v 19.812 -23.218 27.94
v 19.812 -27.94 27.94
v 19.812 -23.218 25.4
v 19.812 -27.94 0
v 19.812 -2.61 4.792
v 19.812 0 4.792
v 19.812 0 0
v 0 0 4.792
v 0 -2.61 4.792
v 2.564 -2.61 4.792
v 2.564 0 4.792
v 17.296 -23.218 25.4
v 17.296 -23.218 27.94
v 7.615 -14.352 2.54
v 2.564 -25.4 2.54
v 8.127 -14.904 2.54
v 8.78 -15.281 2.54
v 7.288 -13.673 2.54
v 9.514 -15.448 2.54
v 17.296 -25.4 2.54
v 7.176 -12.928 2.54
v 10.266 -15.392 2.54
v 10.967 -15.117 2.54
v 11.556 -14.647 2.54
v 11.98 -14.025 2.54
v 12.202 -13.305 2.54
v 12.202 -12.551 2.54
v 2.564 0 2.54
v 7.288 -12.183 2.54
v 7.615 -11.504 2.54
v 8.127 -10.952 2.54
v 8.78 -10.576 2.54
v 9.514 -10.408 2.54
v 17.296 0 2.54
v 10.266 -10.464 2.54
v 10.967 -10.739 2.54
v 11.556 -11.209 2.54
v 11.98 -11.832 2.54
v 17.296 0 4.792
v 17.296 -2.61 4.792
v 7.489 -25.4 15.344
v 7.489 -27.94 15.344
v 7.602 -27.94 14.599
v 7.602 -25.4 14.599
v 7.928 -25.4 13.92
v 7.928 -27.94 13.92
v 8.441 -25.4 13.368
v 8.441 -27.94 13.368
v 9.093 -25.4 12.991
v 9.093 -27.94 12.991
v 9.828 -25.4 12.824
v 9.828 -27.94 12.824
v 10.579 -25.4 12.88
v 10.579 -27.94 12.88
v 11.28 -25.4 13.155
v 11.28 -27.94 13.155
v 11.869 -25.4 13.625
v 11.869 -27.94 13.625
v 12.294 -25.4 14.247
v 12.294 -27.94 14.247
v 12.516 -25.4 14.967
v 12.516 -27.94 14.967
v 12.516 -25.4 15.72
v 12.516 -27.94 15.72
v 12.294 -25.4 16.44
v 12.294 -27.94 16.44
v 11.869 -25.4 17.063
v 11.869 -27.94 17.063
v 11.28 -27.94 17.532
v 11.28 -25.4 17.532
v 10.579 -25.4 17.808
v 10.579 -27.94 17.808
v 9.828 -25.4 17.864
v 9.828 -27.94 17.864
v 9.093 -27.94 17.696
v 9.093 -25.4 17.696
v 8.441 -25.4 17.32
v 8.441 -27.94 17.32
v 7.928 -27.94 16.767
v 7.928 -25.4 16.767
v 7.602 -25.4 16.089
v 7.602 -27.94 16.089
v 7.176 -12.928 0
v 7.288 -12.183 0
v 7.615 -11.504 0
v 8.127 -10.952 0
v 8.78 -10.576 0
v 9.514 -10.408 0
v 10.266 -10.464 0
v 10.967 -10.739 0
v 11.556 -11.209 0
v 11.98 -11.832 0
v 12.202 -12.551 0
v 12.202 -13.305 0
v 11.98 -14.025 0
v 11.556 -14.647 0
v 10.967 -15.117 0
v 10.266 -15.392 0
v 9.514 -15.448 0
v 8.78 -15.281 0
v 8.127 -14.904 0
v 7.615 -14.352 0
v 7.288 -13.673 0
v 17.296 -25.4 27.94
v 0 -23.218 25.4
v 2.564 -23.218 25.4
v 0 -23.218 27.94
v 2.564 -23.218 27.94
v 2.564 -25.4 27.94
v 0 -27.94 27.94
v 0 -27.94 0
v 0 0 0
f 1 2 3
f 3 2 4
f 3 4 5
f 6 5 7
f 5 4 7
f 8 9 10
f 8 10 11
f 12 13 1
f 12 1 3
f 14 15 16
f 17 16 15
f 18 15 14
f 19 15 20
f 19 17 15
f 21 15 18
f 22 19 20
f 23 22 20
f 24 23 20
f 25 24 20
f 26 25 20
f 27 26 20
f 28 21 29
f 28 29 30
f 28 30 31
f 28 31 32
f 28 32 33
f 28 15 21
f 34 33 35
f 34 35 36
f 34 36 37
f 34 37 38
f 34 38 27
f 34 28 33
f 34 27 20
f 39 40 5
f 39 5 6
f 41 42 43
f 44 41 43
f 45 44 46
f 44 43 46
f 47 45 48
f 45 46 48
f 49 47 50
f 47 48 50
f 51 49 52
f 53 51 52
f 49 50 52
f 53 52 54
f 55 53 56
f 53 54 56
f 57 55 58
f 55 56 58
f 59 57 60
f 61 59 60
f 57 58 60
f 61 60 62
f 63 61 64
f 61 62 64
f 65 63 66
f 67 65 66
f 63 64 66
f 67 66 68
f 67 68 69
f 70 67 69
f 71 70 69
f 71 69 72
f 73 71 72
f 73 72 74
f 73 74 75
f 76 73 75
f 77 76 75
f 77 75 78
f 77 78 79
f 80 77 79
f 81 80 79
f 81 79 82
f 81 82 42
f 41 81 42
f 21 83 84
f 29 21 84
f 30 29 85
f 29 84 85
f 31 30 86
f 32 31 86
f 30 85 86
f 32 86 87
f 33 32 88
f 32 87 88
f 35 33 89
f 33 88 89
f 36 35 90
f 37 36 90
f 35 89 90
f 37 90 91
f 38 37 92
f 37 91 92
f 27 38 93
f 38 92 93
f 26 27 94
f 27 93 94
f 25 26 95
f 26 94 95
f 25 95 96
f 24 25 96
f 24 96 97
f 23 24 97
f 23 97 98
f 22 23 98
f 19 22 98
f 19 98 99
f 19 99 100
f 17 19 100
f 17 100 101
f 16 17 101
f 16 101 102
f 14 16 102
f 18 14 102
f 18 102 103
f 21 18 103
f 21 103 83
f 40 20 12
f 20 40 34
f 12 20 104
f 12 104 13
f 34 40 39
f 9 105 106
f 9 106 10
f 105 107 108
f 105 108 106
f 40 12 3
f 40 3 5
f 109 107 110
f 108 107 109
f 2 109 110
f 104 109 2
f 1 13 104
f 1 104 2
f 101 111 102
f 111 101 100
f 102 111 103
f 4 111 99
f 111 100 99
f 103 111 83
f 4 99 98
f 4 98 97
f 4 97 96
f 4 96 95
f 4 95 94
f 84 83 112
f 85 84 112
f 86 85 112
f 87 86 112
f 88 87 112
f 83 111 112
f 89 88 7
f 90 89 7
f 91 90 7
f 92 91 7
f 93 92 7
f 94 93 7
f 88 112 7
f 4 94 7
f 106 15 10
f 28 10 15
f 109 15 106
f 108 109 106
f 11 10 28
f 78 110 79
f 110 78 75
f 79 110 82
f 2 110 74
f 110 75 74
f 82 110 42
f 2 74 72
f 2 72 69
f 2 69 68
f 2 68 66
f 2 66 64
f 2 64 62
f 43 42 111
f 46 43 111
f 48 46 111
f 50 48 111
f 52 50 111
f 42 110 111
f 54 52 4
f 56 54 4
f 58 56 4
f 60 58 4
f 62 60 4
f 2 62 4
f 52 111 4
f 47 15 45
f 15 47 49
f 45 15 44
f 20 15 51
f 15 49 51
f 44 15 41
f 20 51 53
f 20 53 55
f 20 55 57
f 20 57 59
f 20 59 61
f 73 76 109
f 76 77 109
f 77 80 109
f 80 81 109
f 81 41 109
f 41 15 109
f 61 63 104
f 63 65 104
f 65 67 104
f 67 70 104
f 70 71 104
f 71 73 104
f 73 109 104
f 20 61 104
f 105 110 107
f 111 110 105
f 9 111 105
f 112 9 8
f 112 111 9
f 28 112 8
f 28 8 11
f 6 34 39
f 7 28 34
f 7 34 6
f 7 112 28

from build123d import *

# Parameters (mm, degrees)
SKETCH1_W                  = 19.812
SKETCH1_H                  = 27.94
BOSS_EXTRUDE1_DEPTH        = 27.94
SKETCH2_W                  = 14.732
SKETCH2_H                  = 25.4
CUT_EXTRUDE2_DEPTH         = 25.4
CUT_EXTRUDE3_DEPTH         = 45.201838695
CUT_EXTRUDE3_DEPTH_BACK    = 45.201838695
F_8_0_199_DIAMETER_HOLE1_D = 5.0546
F_8_0_199_DIAMETER_HOLE2_D = 5.0546


with BuildPart() as part:
    # Sketch1 → Boss-Extrude1 (new body)
    with BuildSketch(Plane.XY):
        with Locations((9.906, -13.97)):
            Rectangle(SKETCH1_W, SKETCH1_H)
    extrude(amount=BOSS_EXTRUDE1_DEPTH)

    # Sketch2 → Cut-Extrude2 (cut)
    with BuildSketch(Plane.XY.offset(27.94)):
        with Locations((9.92950186, -12.7)):
            Rectangle(SKETCH2_W, SKETCH2_H)
    extrude(amount=-CUT_EXTRUDE2_DEPTH, mode=Mode.SUBTRACT)

    # Sketch3 → Cut-Extrude3 (cut, two sides: drawn at the far end of the back side and taken through both)
    with BuildSketch(Plane(origin=(19.812, 0, 0), x_dir=(0, 0, -1), z_dir=(1, 0, 0)).offset(-CUT_EXTRUDE3_DEPTH_BACK)):
        Polygon((-27.94, 89.026253865), (-27.94, 0), (-27.94, -23.217666002), (-25.4, -23.217666002), (-4.791969325, -2.609635327), (-4.791969325, 0), (-4.791969325, 89.026253865), (-4.791969325, 267.078761596), (-27.94, 267.078761596), align=None)
    extrude(amount=CUT_EXTRUDE3_DEPTH + CUT_EXTRUDE3_DEPTH_BACK, mode=Mode.SUBTRACT)

    # #8 (0.199) Diameter Hole1 (through all)
    with Locations(Plane(origin=(0, -25.4, 0), x_dir=(1, 0, 0), z_dir=(0, 1, 0))):
        with Locations((10.016640072, -15.343780892)):
            Hole(F_8_0_199_DIAMETER_HOLE1_D / 2)

    # #8 (0.199) Diameter Hole2 (through all)
    with Locations(Plane.XY.offset(2.54)):
        with Locations((9.703159868, -12.928139324)):
            Hole(F_8_0_199_DIAMETER_HOLE2_D / 2)


solid = part.part
